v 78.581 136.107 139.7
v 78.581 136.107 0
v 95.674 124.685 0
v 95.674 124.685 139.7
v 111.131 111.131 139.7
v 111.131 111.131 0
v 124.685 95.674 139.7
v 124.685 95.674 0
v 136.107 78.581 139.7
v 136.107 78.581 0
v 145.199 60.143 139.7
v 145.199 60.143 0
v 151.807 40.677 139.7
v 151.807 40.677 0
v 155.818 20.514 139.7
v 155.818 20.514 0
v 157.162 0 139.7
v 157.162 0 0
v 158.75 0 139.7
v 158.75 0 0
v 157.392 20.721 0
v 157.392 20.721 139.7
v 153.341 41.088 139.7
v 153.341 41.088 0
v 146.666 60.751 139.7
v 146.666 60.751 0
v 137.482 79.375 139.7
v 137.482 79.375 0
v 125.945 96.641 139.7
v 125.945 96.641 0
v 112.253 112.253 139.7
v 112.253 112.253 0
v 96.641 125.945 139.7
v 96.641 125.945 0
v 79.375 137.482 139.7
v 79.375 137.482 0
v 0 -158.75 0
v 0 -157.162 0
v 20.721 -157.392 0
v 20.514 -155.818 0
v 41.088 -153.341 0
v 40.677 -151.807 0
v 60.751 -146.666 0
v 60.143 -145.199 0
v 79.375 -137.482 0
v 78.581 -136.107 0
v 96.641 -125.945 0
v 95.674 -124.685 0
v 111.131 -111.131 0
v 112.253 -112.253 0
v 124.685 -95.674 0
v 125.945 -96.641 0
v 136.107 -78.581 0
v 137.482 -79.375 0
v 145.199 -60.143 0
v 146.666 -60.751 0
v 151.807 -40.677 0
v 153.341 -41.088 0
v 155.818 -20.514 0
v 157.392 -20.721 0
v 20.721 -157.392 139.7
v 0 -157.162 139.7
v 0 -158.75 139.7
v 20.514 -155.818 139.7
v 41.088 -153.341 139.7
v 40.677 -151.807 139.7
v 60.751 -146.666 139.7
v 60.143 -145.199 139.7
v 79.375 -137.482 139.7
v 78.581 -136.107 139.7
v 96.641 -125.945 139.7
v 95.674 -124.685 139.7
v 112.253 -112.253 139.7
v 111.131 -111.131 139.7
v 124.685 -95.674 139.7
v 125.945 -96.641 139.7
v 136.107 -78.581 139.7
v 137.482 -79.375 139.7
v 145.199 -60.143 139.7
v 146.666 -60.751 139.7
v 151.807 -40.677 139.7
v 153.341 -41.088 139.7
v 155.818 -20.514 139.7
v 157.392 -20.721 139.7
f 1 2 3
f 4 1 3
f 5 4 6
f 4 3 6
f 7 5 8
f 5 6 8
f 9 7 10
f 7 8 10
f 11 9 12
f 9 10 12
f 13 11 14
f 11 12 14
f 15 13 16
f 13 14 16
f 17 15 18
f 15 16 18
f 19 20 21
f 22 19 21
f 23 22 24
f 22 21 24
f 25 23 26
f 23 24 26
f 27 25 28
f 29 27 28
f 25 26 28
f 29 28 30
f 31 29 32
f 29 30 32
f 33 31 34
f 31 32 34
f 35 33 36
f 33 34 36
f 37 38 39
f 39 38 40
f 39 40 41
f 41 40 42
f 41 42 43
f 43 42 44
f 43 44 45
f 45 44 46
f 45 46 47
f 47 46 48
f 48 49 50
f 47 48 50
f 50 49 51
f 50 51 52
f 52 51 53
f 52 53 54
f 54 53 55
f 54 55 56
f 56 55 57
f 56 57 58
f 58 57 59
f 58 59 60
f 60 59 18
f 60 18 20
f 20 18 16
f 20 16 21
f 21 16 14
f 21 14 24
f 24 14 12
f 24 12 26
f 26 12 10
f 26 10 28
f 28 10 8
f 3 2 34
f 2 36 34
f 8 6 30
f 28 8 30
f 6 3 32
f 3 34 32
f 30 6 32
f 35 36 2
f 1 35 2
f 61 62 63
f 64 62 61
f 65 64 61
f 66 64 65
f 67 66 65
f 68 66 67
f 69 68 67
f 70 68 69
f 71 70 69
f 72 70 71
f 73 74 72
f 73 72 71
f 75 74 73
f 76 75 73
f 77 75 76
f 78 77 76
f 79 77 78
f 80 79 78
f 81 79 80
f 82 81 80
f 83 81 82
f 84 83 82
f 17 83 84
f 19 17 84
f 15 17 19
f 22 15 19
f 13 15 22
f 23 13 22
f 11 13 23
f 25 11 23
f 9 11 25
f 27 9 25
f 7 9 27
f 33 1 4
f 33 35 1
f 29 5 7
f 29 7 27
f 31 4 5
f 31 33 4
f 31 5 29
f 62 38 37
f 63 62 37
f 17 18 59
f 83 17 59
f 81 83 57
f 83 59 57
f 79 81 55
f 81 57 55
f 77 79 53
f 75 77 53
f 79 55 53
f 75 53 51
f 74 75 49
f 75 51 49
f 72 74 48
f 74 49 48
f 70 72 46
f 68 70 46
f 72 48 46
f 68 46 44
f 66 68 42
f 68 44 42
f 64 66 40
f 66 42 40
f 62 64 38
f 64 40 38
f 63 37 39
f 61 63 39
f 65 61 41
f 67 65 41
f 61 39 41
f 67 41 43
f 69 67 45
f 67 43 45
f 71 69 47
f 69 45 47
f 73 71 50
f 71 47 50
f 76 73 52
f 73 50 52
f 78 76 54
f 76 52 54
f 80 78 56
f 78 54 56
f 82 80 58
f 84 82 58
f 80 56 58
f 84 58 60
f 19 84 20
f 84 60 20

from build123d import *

# Parameters (mm, degrees)
BASE_FLANGE1_DEPTH = 139.7


# Sheet-metal steps are written as plain solids
with BuildPart() as part:
    # Sketch1 → Base-Flange1 (new body)
    with BuildSketch(Plane.XY):
        with BuildLine():
            ThreePointArc((78.58125, 136.106717522), (136.106717522, 78.58125), (157.1625, 0))
            ThreePointArc((157.1625, 0), (111.130669498, -111.130669498), (0, -157.1625))
            Line((0, -157.1625), (0, -158.75))
            ThreePointArc((0, -158.75), (112.253201513, -112.253201513), (158.75, 0))
            ThreePointArc((158.75, 0), (137.481532851, 79.375), (79.375, 137.481532851))
            Line((79.375, 137.481532851), (78.58125, 136.106717522))
        make_face()
    extrude(amount=BASE_FLANGE1_DEPTH)


solid = part.part
